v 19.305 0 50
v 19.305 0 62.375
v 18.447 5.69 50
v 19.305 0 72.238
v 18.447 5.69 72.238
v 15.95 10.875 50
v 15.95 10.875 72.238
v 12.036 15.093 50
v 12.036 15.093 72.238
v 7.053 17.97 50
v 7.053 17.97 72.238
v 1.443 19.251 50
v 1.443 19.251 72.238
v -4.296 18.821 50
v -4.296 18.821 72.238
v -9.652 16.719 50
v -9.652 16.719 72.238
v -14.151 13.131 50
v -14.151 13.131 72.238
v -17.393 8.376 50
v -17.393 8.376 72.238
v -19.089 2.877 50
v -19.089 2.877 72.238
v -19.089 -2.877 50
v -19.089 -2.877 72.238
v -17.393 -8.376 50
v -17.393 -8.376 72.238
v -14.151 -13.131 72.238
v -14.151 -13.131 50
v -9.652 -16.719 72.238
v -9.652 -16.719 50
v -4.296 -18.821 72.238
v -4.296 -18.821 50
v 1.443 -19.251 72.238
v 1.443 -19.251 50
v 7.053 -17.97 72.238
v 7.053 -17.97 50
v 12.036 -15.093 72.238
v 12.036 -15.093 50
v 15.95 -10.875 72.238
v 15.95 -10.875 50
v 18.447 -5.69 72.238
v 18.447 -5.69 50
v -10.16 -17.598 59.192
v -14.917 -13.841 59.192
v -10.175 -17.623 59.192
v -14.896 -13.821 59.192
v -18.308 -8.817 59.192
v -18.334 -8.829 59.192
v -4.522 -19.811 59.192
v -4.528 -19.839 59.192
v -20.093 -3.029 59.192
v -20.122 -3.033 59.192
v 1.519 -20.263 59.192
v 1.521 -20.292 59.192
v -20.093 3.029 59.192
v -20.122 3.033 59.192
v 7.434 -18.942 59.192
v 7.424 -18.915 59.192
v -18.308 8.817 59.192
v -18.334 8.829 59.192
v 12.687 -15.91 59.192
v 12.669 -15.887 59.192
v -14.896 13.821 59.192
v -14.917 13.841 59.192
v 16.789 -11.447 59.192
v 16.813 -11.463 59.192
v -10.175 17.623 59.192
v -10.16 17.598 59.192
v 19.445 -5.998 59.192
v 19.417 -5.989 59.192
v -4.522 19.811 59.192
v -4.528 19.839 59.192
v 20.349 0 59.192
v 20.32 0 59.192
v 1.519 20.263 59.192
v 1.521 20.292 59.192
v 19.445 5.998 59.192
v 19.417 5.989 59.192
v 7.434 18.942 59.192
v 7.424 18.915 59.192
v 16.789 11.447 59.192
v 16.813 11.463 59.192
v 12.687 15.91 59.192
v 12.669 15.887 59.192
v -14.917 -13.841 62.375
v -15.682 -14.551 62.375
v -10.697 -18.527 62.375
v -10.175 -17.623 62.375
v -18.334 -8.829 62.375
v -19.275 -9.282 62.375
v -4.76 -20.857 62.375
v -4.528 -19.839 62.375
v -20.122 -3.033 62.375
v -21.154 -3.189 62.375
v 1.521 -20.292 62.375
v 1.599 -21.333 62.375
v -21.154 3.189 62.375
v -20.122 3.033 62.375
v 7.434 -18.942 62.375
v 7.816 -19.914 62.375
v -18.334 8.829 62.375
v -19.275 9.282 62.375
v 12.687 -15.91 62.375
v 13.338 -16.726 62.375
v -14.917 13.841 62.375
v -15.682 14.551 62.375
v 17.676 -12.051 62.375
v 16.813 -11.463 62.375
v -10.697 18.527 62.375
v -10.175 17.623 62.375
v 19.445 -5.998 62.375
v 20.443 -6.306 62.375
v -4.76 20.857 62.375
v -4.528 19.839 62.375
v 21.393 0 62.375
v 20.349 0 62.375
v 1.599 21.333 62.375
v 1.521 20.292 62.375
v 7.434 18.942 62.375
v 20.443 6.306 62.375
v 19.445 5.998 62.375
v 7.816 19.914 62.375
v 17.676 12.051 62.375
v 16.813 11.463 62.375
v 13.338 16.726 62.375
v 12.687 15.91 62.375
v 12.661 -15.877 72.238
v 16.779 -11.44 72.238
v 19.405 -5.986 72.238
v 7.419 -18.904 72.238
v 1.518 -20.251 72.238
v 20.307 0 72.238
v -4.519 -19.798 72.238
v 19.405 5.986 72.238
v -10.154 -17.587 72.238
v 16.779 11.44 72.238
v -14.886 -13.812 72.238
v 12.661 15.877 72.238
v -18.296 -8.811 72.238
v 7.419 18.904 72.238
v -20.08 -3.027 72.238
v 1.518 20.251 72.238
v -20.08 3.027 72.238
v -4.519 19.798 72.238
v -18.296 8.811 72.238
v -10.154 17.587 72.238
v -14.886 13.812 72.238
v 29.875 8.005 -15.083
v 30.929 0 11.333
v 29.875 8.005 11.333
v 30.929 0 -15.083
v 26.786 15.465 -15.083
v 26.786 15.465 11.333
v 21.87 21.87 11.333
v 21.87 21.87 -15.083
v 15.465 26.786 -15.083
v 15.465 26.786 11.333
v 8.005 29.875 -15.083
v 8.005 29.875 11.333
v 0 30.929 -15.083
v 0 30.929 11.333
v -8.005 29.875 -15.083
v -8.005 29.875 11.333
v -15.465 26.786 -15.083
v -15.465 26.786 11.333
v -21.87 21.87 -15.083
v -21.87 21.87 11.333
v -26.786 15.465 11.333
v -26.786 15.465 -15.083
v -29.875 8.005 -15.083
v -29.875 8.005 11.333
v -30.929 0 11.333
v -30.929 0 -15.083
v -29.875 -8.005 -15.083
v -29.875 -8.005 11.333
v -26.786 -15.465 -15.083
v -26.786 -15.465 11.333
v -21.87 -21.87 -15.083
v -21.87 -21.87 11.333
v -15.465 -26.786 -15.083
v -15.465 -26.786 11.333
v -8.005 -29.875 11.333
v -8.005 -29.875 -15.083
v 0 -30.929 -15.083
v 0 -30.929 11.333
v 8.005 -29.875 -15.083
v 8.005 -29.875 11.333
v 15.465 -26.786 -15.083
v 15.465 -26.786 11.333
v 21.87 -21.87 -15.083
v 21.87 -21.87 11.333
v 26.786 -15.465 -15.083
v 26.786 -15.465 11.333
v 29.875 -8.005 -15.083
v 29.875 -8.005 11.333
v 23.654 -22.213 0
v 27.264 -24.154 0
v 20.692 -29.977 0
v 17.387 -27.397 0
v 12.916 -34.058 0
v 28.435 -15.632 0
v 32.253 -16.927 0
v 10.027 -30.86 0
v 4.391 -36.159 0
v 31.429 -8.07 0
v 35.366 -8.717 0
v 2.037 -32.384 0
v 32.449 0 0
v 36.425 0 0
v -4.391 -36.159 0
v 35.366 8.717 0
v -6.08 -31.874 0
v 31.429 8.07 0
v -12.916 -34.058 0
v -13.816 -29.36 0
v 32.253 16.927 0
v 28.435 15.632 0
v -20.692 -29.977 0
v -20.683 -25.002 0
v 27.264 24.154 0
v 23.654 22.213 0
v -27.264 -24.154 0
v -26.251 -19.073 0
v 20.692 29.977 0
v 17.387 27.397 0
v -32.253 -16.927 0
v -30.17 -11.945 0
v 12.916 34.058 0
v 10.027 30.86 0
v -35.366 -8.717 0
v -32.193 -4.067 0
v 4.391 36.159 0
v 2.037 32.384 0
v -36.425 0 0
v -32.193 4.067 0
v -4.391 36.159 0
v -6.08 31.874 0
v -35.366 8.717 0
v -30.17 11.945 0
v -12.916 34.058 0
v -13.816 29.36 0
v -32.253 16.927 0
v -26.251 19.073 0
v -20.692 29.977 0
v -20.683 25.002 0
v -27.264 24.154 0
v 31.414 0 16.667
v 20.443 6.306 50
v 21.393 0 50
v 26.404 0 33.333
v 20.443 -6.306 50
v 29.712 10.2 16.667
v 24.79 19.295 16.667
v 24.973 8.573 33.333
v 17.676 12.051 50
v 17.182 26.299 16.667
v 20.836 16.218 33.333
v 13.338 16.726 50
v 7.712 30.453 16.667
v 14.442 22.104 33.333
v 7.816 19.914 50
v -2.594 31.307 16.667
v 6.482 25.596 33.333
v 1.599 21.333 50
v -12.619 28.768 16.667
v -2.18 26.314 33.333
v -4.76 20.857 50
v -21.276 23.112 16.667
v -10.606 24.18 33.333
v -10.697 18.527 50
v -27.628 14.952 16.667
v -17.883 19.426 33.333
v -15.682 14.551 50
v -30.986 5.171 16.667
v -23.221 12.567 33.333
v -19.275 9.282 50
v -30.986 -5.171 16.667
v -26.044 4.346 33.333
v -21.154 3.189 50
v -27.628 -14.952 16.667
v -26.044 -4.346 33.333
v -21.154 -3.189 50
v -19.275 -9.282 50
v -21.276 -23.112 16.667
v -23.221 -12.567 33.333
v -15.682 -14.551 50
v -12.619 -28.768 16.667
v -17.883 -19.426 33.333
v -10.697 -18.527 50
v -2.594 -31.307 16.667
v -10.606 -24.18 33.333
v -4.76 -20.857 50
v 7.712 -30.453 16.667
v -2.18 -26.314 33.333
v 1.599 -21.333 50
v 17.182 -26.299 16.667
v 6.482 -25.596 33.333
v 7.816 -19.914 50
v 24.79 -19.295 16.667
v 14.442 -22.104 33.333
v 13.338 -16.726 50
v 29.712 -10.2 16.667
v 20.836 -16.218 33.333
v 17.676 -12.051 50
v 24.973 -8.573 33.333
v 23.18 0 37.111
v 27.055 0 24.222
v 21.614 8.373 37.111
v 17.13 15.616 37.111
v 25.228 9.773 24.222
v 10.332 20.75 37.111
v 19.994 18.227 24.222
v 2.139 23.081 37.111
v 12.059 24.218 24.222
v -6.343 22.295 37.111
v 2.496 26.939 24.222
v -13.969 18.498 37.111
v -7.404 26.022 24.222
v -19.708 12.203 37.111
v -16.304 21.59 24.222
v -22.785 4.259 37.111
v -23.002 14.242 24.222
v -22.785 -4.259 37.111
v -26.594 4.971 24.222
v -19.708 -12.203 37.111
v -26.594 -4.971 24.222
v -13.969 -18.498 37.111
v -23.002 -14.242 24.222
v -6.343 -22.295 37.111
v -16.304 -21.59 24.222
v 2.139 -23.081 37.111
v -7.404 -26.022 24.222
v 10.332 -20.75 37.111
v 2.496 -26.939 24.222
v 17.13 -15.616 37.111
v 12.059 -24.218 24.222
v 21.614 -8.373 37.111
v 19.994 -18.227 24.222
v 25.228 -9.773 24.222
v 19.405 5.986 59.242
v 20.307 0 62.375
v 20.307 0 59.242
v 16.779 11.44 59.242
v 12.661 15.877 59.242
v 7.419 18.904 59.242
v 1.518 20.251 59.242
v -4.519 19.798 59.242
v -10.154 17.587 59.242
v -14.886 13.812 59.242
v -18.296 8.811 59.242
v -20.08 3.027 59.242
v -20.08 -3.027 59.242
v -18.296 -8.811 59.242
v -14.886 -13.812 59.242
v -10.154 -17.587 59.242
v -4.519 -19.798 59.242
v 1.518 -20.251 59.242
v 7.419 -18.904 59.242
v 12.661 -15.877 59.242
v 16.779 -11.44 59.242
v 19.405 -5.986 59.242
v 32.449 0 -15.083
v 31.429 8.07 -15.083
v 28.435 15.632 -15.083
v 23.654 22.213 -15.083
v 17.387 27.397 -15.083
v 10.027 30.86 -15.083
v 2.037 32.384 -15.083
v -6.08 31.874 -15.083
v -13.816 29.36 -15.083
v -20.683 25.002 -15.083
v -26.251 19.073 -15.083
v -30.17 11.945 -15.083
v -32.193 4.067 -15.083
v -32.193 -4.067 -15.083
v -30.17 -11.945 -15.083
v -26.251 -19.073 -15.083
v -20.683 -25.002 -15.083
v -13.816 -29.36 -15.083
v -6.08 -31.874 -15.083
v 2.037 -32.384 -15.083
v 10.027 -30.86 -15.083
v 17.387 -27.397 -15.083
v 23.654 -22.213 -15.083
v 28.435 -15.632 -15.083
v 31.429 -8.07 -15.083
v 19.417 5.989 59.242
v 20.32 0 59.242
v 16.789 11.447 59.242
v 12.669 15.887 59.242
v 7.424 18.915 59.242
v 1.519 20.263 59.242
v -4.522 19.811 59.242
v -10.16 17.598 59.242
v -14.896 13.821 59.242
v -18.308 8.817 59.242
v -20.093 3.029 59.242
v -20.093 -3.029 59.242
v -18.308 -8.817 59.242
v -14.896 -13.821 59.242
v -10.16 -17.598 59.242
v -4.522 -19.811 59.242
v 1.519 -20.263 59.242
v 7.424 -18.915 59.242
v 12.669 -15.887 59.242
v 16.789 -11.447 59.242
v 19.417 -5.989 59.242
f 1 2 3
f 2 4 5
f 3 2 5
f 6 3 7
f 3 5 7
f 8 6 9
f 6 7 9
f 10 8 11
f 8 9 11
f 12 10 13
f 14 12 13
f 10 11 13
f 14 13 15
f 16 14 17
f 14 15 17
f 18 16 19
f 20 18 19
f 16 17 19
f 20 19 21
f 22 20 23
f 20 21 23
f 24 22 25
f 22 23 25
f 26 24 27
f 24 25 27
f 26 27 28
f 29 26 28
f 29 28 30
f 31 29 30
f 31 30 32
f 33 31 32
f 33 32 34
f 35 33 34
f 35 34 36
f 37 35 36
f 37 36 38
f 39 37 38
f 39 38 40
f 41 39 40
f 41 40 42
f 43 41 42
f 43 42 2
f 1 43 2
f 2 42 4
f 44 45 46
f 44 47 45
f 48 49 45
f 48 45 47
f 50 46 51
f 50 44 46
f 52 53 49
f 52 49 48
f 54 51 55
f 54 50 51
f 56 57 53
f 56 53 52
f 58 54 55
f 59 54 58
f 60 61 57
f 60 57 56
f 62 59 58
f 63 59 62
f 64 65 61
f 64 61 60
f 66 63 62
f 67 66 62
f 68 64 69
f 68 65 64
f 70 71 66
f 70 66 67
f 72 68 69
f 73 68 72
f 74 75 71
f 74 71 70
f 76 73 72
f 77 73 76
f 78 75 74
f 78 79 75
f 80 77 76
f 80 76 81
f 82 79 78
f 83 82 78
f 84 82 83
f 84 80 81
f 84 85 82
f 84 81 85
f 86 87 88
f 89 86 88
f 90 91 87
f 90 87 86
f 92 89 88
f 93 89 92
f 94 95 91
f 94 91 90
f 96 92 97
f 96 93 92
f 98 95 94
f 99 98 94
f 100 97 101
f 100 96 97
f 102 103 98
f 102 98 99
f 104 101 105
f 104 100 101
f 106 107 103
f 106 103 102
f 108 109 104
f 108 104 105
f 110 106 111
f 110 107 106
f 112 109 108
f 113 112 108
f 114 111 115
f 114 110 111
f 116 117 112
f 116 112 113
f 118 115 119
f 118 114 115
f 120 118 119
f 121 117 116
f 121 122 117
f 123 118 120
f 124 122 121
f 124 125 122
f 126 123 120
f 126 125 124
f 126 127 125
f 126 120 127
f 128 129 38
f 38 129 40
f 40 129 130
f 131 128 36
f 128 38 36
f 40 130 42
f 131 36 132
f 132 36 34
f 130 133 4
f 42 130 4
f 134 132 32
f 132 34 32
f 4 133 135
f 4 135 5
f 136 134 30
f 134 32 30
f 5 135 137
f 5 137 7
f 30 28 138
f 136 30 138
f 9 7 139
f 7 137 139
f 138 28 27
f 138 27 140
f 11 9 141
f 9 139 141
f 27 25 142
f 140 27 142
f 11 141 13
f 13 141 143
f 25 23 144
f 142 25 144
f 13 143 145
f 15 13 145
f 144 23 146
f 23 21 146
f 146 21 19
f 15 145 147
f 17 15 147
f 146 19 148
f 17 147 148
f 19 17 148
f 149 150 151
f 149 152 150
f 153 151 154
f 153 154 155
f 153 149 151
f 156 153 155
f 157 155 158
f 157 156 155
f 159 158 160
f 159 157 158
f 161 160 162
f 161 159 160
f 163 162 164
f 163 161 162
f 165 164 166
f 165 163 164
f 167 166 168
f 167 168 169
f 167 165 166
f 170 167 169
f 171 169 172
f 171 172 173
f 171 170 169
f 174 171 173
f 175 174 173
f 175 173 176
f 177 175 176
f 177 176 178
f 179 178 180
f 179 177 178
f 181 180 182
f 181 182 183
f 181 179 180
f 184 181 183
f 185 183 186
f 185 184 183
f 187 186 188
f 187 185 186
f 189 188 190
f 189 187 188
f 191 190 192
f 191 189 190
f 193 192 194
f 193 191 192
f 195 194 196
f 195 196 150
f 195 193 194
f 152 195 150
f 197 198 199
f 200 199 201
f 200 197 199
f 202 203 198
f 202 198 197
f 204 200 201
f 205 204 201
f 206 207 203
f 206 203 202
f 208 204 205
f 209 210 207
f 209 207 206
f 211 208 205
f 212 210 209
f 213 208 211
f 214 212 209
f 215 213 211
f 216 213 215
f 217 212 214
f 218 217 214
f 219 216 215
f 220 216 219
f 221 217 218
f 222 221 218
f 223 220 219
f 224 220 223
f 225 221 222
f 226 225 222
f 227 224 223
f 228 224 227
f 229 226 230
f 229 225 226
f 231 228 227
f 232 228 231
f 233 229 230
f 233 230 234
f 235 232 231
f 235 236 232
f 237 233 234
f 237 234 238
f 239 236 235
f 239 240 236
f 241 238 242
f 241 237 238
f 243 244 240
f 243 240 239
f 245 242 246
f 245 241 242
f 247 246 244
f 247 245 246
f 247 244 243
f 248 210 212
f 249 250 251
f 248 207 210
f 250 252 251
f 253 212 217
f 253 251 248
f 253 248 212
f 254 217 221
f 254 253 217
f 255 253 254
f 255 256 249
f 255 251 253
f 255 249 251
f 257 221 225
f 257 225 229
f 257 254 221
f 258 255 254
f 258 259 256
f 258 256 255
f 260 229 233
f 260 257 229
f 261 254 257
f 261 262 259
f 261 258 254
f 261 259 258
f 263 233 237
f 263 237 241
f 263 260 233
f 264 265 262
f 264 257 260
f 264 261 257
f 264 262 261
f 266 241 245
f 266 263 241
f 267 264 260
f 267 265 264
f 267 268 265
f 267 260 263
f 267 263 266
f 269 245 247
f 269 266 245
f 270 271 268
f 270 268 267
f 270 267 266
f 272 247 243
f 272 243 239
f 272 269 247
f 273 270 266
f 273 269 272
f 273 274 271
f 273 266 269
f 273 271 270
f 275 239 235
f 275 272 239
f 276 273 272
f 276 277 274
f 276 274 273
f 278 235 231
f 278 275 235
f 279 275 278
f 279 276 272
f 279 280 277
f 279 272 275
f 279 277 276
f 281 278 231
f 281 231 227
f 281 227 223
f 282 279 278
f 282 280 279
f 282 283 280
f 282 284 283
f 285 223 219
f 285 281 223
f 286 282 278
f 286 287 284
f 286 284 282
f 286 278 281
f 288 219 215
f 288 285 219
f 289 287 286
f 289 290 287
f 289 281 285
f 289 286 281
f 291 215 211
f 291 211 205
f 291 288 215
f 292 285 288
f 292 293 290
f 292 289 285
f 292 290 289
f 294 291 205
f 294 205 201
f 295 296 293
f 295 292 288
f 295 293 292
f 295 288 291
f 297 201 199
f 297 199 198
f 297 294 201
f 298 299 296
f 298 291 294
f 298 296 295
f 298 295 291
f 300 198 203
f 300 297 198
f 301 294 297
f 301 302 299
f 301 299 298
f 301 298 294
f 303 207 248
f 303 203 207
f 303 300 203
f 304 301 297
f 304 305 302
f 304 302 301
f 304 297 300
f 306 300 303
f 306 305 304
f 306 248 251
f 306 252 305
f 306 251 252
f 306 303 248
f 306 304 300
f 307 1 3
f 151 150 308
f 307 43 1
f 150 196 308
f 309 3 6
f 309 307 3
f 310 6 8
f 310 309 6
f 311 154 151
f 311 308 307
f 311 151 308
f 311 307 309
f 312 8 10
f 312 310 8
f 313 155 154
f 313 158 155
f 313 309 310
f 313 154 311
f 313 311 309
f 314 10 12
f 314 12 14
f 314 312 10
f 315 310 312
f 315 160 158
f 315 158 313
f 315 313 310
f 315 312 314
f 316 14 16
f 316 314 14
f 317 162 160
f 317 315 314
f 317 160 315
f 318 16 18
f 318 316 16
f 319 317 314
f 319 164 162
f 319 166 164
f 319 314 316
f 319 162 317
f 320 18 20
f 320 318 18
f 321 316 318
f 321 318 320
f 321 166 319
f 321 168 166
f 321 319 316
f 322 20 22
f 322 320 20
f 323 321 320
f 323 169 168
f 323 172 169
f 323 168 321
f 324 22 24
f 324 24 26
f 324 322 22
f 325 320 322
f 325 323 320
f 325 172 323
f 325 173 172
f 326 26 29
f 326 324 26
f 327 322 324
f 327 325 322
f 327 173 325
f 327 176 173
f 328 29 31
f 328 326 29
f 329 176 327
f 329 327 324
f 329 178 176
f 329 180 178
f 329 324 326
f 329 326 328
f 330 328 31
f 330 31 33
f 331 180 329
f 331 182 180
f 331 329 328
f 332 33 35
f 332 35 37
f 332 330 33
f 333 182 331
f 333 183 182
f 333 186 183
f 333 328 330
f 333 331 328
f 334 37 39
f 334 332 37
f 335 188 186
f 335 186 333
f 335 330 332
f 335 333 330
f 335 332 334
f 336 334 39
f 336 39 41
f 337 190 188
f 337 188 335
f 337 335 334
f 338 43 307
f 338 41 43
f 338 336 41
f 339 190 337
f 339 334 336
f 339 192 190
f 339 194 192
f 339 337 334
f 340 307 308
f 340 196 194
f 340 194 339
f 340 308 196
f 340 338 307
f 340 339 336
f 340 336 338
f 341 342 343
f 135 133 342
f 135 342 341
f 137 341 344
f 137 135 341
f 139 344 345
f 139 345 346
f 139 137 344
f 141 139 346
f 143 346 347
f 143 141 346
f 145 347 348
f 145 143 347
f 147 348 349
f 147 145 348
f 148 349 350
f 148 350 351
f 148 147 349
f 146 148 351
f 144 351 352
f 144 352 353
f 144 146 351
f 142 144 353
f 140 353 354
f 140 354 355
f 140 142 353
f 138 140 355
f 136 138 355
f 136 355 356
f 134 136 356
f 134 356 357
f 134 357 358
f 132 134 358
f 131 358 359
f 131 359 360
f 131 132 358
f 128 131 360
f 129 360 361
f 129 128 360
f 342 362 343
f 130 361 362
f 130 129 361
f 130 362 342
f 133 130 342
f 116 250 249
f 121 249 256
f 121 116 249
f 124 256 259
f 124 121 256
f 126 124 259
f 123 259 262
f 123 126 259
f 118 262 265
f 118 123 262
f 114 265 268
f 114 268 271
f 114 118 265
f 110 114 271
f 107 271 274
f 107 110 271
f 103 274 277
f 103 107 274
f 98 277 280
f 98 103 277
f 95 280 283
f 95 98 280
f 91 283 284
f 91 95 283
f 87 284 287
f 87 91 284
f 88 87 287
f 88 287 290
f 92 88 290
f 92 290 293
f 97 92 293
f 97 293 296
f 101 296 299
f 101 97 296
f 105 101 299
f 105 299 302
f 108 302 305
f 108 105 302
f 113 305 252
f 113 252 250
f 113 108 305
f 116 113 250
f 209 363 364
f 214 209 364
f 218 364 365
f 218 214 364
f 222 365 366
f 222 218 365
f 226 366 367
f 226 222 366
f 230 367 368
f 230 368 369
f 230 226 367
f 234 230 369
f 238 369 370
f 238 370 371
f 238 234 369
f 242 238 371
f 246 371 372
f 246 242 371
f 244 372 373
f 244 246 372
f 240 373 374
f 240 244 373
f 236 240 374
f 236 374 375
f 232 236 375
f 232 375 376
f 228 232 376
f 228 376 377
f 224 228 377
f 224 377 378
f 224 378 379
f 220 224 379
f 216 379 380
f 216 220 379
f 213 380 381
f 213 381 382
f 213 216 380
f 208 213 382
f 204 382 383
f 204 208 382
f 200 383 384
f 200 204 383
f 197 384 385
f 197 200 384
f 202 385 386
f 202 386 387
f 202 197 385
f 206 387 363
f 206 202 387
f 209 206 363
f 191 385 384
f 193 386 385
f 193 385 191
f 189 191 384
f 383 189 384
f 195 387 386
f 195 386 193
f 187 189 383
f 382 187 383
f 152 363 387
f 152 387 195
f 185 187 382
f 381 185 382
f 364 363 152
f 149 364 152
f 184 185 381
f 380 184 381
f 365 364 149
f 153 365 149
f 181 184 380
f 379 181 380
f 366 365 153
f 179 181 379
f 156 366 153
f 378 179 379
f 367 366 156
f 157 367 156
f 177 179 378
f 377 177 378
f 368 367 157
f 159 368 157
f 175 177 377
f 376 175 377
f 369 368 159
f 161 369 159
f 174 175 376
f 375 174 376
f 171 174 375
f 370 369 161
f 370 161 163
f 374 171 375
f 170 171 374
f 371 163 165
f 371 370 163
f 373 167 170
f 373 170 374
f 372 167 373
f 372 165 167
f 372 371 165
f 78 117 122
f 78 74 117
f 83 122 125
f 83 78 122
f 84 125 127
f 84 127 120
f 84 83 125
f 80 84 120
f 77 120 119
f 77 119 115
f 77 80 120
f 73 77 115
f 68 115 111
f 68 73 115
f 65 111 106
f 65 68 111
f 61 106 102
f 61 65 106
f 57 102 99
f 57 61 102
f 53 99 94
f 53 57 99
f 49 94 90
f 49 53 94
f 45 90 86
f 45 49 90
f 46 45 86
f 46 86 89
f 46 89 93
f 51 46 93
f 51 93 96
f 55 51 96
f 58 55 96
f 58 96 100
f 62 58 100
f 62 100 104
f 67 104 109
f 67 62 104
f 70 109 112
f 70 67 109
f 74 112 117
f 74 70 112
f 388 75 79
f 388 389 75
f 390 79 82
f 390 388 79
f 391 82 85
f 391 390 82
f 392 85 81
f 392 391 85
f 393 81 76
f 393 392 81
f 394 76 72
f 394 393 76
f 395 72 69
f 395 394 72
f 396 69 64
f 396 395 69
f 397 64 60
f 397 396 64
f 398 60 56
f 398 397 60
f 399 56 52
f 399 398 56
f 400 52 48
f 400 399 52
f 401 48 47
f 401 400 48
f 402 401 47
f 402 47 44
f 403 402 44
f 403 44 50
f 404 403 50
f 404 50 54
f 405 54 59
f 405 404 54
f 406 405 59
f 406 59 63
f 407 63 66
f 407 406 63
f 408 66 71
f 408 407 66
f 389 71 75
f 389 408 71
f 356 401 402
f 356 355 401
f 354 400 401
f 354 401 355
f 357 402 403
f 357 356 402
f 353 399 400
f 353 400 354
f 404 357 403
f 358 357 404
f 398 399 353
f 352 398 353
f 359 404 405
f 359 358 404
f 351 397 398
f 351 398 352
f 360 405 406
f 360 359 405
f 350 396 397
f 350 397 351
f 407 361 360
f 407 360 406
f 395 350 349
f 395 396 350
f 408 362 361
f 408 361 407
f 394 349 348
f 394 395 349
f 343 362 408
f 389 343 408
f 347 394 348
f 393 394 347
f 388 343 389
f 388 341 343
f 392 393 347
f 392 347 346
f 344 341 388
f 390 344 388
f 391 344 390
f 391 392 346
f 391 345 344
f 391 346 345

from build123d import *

# Parameters (mm, degrees)
F0_W   = 1.5191692636
F0_H   = 15.0828957558
F0_W_2 = 1.0024315159
F0_H_2 = 9.863063693


with BuildPart() as f1:
    # F0 (on Front) → F1 (revolve)
    with BuildSketch(Plane.XZ):
        Polygon((36.4248545221, 0), (21.3932929025, 50), (21.3932929025, 62.3753145337), (20.3490806933, 62.3753145337), (20.3490806933, 59.1916404665), (20.32, 59.1916404665), (20.32, 59.2419579625), (20.3073, 59.2419579625), (19.3048684841, 56.1876572669), (19.3048684841, 50), (30.9293307364, 11.333151716), (32.4485, 6.2798867857), (34.3364301037, 0), align=None)
        Polygon((32.4485, 0), (34.3364301037, 0), (32.4485, 6.2798867857), align=None)
        Polygon((32.4485, 0), (32.4485, 6.2798867857), (30.9293307364, 11.333151716), (30.9293307364, 0), align=None)
        with Locations((31.6889153682, -7.5414478779)):
            Rectangle(F0_W, F0_H)
        with Locations((19.806084242, 67.3068463802)):
            Rectangle(F0_W_2, F0_H_2)
        Polygon((20.3073, 59.2419579625), (20.3073, 62.3753145337), (19.3048684841, 62.3753145337), (19.3048684841, 56.1876572669), align=None)
    revolve(axis=Axis((0, 0, 25), (0, 0, 1)))


solid = f1.part
